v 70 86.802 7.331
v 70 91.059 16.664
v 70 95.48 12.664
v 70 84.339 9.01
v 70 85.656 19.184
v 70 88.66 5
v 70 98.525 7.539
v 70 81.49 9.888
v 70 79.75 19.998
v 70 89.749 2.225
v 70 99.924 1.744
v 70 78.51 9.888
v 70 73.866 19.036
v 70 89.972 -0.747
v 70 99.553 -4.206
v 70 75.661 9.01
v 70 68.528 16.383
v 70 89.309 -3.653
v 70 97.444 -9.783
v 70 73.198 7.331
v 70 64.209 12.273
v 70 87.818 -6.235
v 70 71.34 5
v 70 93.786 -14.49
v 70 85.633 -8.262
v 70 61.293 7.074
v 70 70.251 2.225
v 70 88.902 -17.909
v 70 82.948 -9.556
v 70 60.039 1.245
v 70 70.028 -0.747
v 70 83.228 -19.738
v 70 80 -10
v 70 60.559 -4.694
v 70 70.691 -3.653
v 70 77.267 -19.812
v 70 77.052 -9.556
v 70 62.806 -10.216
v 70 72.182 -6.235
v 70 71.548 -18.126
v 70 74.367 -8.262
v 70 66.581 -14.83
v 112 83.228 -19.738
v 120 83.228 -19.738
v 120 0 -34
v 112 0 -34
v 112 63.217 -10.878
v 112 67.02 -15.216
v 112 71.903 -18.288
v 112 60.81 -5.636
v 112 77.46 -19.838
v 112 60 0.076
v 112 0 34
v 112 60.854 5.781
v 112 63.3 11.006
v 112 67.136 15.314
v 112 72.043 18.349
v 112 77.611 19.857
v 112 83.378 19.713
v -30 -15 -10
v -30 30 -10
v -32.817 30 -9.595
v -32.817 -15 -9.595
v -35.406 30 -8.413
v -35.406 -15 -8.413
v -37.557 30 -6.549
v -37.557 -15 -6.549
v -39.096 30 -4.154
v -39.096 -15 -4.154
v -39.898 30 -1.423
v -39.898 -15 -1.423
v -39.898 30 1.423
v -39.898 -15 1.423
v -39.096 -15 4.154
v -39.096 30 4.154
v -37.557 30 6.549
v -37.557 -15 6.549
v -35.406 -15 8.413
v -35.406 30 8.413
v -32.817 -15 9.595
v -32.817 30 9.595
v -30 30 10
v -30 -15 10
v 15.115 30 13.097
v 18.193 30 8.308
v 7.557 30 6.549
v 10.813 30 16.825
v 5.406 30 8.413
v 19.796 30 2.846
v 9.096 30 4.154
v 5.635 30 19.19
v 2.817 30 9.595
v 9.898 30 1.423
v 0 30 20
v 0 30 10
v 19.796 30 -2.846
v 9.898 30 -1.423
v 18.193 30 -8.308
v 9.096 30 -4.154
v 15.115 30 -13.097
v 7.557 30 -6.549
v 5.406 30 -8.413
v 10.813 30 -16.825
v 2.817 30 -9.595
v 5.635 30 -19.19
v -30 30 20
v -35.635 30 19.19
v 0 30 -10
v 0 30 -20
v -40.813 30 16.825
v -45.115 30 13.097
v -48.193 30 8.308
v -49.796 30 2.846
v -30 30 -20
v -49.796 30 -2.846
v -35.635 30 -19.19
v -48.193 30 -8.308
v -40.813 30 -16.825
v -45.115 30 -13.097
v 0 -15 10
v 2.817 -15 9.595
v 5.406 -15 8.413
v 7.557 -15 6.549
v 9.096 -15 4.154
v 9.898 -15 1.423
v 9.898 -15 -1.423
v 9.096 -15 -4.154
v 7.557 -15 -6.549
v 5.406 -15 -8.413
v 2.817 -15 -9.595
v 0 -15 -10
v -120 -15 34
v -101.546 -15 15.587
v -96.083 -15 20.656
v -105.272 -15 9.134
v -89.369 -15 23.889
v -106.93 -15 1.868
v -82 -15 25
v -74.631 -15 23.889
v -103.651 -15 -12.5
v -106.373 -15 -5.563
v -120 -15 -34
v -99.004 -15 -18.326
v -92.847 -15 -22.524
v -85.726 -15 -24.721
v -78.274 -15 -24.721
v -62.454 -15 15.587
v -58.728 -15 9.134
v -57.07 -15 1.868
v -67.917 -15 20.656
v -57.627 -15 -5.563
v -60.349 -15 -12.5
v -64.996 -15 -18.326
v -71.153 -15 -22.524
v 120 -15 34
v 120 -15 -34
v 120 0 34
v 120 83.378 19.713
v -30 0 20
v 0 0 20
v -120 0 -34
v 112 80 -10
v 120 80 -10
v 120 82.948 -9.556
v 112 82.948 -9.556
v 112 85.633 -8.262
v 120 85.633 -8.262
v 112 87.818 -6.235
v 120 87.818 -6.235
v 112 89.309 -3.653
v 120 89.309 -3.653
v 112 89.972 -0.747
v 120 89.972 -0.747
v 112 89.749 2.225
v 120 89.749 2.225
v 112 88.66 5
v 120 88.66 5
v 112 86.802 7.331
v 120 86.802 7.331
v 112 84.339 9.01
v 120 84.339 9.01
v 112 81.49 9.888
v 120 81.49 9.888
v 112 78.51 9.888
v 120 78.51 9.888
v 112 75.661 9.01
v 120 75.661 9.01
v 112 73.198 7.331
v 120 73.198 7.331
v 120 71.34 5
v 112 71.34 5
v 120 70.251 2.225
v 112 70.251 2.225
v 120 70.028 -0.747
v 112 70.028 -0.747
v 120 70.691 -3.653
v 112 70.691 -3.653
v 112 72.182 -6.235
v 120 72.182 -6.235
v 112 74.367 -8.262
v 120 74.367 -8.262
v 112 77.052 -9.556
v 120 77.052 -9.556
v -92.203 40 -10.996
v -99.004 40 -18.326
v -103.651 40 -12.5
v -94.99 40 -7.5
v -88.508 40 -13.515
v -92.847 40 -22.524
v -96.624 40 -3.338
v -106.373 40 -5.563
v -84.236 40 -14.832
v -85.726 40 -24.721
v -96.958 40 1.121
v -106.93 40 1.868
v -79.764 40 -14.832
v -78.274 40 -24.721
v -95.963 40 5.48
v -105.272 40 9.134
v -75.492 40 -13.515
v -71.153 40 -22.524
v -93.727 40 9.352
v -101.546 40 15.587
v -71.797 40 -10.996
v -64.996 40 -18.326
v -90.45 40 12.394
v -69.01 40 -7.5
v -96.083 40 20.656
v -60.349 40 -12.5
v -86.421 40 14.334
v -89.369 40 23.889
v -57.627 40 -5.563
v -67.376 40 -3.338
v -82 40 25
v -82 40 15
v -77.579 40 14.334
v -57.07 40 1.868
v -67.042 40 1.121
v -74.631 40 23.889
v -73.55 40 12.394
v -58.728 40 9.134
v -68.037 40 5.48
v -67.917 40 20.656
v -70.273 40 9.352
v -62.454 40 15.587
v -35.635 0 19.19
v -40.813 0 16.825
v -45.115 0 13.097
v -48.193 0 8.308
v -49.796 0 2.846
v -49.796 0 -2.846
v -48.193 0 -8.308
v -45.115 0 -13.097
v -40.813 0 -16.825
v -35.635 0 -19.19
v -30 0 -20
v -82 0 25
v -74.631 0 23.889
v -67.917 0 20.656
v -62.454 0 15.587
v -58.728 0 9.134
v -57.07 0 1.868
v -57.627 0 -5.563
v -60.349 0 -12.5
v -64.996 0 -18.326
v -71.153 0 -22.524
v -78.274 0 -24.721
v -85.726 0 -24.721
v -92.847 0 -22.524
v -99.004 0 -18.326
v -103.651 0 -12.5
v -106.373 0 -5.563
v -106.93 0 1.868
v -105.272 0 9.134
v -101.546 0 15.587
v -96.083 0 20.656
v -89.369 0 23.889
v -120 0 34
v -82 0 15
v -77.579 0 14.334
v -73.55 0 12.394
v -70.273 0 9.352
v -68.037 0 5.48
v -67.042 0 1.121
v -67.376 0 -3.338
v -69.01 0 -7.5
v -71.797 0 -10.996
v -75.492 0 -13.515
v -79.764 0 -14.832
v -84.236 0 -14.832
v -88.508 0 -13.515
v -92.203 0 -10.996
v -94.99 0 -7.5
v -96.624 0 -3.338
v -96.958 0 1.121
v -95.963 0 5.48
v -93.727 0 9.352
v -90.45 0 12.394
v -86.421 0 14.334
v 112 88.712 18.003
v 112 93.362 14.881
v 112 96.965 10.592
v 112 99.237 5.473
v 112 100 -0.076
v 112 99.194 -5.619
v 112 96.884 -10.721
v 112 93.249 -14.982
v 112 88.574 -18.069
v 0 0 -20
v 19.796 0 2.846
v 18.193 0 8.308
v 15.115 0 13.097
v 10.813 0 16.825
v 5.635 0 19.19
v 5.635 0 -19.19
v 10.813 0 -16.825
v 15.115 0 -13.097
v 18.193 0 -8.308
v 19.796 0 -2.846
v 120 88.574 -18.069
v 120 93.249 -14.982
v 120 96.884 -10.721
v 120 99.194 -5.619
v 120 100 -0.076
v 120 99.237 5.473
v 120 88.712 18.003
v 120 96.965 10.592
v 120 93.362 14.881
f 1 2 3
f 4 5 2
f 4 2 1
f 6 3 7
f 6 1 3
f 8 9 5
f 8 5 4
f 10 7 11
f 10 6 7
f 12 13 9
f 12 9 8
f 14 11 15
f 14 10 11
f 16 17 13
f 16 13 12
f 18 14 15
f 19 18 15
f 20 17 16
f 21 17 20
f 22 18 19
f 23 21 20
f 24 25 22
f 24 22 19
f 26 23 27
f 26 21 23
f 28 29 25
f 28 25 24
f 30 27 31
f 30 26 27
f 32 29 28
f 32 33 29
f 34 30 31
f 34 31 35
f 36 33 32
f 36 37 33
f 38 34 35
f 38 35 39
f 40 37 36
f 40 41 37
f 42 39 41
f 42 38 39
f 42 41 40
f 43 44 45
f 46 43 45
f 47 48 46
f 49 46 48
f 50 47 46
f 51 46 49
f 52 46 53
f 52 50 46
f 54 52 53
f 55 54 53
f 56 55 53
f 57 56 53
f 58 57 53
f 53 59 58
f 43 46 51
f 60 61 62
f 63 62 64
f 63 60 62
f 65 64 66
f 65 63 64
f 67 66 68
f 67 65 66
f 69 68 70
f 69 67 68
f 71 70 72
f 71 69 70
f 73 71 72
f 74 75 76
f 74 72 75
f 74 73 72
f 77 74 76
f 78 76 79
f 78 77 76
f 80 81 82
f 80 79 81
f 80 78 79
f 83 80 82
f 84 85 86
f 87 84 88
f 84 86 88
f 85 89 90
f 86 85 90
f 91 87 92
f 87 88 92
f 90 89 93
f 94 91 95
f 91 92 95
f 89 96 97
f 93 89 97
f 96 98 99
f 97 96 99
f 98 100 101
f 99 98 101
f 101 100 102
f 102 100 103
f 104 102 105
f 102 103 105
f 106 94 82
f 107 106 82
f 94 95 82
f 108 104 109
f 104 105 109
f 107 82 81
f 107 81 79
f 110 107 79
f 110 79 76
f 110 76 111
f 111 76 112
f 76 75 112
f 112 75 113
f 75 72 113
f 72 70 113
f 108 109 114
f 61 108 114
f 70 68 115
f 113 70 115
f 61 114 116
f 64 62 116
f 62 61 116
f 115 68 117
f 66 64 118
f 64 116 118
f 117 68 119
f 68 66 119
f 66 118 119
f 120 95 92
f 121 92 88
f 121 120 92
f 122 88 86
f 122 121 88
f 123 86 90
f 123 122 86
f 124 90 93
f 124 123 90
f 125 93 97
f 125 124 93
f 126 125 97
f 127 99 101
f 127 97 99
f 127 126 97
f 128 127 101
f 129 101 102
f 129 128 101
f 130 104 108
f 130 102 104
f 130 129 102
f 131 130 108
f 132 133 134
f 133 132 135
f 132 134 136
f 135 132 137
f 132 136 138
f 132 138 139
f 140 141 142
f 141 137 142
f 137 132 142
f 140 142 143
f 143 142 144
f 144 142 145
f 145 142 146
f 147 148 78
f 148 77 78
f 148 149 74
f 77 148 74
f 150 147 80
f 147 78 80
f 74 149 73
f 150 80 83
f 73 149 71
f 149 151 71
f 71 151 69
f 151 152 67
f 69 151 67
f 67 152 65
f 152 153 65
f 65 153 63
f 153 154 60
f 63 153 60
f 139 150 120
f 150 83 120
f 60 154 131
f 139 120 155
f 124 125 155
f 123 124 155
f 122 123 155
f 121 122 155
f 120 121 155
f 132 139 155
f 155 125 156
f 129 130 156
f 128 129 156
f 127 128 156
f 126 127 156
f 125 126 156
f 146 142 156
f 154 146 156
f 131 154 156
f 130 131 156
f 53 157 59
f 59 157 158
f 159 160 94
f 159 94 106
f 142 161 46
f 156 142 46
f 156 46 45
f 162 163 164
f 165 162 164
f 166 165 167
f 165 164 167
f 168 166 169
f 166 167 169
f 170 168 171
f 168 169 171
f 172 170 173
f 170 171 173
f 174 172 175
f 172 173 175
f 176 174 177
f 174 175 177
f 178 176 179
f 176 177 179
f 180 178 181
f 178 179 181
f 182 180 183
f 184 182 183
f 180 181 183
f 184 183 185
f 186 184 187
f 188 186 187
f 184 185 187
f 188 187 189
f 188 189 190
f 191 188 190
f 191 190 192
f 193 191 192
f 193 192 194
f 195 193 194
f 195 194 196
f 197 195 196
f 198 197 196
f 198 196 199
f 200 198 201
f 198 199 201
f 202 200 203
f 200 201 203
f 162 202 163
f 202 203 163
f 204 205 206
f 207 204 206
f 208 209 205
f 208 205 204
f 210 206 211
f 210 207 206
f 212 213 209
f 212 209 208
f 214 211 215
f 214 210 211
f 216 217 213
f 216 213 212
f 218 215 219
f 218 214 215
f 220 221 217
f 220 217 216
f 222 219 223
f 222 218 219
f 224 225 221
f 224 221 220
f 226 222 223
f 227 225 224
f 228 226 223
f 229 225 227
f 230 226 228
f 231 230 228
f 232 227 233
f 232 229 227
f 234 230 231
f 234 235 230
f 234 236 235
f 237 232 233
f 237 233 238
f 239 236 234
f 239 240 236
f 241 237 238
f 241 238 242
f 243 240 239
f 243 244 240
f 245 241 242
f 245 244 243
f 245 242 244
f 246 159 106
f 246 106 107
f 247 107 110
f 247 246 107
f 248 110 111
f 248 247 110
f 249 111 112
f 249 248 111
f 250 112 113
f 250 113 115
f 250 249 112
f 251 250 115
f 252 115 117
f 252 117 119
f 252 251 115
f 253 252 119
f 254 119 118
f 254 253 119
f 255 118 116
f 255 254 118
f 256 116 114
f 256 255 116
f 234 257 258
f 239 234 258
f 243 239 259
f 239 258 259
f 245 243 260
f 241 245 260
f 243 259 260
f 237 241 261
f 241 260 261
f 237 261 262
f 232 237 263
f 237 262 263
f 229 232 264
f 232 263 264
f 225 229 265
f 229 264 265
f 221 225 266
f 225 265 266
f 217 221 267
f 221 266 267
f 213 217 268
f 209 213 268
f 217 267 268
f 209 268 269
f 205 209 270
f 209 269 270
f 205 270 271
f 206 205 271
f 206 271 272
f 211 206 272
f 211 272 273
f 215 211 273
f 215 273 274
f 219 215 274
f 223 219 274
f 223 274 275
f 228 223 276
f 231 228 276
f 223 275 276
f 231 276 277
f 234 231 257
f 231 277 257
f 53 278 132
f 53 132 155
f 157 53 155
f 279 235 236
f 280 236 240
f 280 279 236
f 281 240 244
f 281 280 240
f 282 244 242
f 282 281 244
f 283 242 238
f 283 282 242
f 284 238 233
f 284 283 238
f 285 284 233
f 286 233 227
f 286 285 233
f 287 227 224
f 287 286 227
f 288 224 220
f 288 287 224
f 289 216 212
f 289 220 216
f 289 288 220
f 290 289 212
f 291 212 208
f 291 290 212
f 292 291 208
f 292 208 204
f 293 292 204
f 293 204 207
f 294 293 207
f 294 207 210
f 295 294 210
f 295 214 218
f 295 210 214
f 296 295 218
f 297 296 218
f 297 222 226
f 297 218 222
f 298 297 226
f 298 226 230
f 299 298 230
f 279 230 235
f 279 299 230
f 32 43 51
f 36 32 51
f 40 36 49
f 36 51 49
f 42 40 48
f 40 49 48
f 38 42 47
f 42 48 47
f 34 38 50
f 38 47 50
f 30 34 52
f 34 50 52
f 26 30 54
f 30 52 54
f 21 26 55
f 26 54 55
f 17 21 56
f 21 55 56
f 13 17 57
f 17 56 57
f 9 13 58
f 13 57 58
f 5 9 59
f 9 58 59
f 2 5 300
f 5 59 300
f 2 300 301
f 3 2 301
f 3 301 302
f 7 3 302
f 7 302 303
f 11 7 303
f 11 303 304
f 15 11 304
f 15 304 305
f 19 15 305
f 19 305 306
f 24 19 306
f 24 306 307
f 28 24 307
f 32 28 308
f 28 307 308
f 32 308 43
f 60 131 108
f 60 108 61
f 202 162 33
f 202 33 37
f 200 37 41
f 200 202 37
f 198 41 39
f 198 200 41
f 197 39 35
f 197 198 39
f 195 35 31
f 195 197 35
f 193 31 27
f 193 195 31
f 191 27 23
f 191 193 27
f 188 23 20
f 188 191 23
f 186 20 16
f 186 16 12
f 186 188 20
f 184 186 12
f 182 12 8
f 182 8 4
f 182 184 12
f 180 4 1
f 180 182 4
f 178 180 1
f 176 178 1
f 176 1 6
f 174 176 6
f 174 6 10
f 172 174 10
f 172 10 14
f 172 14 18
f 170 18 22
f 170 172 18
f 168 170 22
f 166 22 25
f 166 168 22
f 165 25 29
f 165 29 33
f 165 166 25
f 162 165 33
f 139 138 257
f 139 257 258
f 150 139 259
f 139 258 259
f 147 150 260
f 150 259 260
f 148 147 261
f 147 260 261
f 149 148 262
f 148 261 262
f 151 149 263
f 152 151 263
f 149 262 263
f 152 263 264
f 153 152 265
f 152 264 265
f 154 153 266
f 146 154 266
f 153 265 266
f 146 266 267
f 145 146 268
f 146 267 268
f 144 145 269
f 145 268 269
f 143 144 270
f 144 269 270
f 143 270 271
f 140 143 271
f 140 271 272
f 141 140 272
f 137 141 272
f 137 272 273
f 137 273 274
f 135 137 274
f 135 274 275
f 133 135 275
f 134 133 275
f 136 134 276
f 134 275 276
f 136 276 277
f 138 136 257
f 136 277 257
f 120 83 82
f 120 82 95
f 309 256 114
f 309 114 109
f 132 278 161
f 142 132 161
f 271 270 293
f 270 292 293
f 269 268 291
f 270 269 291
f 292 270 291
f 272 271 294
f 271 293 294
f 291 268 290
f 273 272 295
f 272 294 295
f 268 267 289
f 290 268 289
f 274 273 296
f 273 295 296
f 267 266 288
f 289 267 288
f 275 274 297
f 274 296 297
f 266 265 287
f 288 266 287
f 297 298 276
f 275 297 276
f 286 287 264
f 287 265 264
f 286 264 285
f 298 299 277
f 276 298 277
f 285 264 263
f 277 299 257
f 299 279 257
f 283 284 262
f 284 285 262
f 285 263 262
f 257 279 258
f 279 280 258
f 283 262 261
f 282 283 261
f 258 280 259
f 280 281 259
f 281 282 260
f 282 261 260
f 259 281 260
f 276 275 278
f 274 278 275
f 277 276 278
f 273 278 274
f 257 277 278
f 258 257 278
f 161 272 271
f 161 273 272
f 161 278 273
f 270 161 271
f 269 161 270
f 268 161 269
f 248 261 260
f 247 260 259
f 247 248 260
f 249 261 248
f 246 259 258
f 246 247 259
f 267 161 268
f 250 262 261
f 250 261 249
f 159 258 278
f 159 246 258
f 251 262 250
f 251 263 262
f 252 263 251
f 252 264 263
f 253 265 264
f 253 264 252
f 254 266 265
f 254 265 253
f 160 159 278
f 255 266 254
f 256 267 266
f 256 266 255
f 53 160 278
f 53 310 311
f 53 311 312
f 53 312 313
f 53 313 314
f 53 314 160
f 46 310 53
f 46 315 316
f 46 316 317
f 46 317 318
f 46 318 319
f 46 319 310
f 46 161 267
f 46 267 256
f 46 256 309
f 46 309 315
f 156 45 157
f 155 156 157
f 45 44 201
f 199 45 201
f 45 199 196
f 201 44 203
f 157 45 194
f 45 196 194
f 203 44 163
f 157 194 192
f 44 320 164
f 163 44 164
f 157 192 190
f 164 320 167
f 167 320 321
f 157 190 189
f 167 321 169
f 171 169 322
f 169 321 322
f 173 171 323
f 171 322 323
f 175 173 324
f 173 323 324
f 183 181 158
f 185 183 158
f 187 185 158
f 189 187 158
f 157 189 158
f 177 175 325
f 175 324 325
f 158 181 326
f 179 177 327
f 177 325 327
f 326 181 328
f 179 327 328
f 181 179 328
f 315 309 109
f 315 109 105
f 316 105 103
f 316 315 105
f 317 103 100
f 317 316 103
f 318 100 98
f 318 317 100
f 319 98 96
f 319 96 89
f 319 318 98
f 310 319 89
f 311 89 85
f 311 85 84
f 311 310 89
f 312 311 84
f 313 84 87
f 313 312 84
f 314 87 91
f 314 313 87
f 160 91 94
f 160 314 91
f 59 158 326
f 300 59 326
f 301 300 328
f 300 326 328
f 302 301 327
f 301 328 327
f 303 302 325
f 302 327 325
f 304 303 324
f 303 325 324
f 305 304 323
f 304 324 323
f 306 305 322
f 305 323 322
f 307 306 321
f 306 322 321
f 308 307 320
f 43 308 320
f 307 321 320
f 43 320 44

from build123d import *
from build123d.topology import SkipClean

# Parameters (mm, degrees)
SKETCH2_W               = 240
SKETCH2_H               = 68
SKETCH2_R               = 25
BOSS_EXTRUDE1_DEPTH     = 15
SKETCH2_4_R             = 25
BOSS_EXTRUDE3_DEPTH     = 40
SKETCH2_5_R             = 15
CUT_EXTRUDE1_DEPTH      = 52
BOSS_EXTRUDE6_DEPTH     = 30
CUT_EXTRUDE3_DEPTH      = 30
CUT_EXTRUDE3_DEPTH_BACK = 30
SKETCH9_R               = 10
BOSS_EXTRUDE7_DEPTH     = 8
SKETCH10_R              = 20
SKETCH10_R_2            = 10
BOSS_EXTRUDE8_DEPTH     = 42


with BuildPart() as part:
    # Sketch2 → Boss-Extrude1 (new body)
    with BuildSketch(Plane(origin=(0, 0, 0), x_dir=(1, 0, 0), z_dir=(0, 1, 0))):
        Rectangle(SKETCH2_W, SKETCH2_H)
        with Locations((-82, 0)):
            Circle(SKETCH2_R, mode=Mode.SUBTRACT)
    extrude(amount=-BOSS_EXTRUDE1_DEPTH)

    # Sketch4 → Boss-Extrude6 (add)
    with BuildSketch(Plane(origin=(0, 0, 0), x_dir=(1, 0, 0), z_dir=(0, 1, 0))):
        with BuildLine():
            Line((-30, 20), (0, 20))
            ThreePointArc((0, 20), (20, 0), (0, -20))
            Line((0, -20), (-30, -20))
            ThreePointArc((-30, -20), (-50, 0), (-30, 20))
        make_face()
        with BuildLine():
            Line((-30, 10), (0, 10))
            ThreePointArc((0, 10), (10, 0), (0, -10))
            Line((0, -10), (-30, -10))
            ThreePointArc((-30, -10), (-40, 0), (-30, 10))
        make_face(mode=Mode.SUBTRACT)
    extrude(amount=BOSS_EXTRUDE6_DEPTH)

    # Sketch6 → Cut-Extrude3 (cut, two sides: drawn at the far end of the back side and taken through both)
    with SkipClean():  # the faces are left unmerged after this step: merging them gives an invalid solid
        with BuildSketch(Plane(origin=(0, 0, 0), x_dir=(1, 0, 0), z_dir=(0, 1, 0)).offset(-CUT_EXTRUDE3_DEPTH_BACK)):
            with BuildLine():
                Line((-30, -10), (0, -10))
                ThreePointArc((0, -10), (10, 0), (0, 10))
                Line((0, 10), (-30, 10))
                ThreePointArc((-30, 10), (-40, 0), (-30, -10))
            make_face()
        extrude(amount=CUT_EXTRUDE3_DEPTH + CUT_EXTRUDE3_DEPTH_BACK, mode=Mode.SUBTRACT)
    add(part.part.scale(1), mode=Mode.REPLACE)  # the faces are merged on a copy

    # Sketch9 → Boss-Extrude7 (add)
    with BuildSketch(Plane(origin=(120, 0, 0), x_dir=(0, 0, -1), z_dir=(1, 0, 0))):
        with BuildLine():
            Line((-34, 0), (-19.712682674, 83.377890137))
            ThreePointArc((-19.712682674, 83.377890137), (0.076073465, 99.99985532), (19.737808866, 83.227832272))
            Line((19.737808866, 83.227832272), (34, 0))
            Line((34, 0), (-34, 0))
        make_face()
        with Locations((0, 80)):
            Circle(SKETCH9_R, mode=Mode.SUBTRACT)
    extrude(amount=-BOSS_EXTRUDE7_DEPTH)

    # Sketch10 → Boss-Extrude8 (add)
    with SkipClean():  # the faces are left unmerged after this step: merging them gives an invalid solid
        with BuildSketch(Plane.ZY.offset(-112)):
            with Locations((0, 80)):
                Circle(SKETCH10_R)
            with Locations((0, 80)):
                Circle(SKETCH10_R_2, mode=Mode.SUBTRACT)
        extrude(amount=BOSS_EXTRUDE8_DEPTH)
    add(part.part.scale(1), mode=Mode.REPLACE)  # the faces are merged on a copy


with BuildPart() as body_2:
    # Sketch2<4> → Boss-Extrude3 (new body)
    with BuildSketch(Plane(origin=(0, 0, 0), x_dir=(1, 0, 0), z_dir=(0, 1, 0))):
        with Locations((-82, 0)):
            Circle(SKETCH2_4_R)
    extrude(amount=BOSS_EXTRUDE3_DEPTH)

    # Sketch2<5> → Cut-Extrude1 (cut)
    with BuildSketch(Plane(origin=(0, 0, 0), x_dir=(1, 0, 0), z_dir=(0, 1, 0))):
        with Locations((-82, 0)):
            Circle(SKETCH2_5_R)
    extrude(amount=CUT_EXTRUDE1_DEPTH, mode=Mode.SUBTRACT)


solid = Compound([part.part, body_2.part])
